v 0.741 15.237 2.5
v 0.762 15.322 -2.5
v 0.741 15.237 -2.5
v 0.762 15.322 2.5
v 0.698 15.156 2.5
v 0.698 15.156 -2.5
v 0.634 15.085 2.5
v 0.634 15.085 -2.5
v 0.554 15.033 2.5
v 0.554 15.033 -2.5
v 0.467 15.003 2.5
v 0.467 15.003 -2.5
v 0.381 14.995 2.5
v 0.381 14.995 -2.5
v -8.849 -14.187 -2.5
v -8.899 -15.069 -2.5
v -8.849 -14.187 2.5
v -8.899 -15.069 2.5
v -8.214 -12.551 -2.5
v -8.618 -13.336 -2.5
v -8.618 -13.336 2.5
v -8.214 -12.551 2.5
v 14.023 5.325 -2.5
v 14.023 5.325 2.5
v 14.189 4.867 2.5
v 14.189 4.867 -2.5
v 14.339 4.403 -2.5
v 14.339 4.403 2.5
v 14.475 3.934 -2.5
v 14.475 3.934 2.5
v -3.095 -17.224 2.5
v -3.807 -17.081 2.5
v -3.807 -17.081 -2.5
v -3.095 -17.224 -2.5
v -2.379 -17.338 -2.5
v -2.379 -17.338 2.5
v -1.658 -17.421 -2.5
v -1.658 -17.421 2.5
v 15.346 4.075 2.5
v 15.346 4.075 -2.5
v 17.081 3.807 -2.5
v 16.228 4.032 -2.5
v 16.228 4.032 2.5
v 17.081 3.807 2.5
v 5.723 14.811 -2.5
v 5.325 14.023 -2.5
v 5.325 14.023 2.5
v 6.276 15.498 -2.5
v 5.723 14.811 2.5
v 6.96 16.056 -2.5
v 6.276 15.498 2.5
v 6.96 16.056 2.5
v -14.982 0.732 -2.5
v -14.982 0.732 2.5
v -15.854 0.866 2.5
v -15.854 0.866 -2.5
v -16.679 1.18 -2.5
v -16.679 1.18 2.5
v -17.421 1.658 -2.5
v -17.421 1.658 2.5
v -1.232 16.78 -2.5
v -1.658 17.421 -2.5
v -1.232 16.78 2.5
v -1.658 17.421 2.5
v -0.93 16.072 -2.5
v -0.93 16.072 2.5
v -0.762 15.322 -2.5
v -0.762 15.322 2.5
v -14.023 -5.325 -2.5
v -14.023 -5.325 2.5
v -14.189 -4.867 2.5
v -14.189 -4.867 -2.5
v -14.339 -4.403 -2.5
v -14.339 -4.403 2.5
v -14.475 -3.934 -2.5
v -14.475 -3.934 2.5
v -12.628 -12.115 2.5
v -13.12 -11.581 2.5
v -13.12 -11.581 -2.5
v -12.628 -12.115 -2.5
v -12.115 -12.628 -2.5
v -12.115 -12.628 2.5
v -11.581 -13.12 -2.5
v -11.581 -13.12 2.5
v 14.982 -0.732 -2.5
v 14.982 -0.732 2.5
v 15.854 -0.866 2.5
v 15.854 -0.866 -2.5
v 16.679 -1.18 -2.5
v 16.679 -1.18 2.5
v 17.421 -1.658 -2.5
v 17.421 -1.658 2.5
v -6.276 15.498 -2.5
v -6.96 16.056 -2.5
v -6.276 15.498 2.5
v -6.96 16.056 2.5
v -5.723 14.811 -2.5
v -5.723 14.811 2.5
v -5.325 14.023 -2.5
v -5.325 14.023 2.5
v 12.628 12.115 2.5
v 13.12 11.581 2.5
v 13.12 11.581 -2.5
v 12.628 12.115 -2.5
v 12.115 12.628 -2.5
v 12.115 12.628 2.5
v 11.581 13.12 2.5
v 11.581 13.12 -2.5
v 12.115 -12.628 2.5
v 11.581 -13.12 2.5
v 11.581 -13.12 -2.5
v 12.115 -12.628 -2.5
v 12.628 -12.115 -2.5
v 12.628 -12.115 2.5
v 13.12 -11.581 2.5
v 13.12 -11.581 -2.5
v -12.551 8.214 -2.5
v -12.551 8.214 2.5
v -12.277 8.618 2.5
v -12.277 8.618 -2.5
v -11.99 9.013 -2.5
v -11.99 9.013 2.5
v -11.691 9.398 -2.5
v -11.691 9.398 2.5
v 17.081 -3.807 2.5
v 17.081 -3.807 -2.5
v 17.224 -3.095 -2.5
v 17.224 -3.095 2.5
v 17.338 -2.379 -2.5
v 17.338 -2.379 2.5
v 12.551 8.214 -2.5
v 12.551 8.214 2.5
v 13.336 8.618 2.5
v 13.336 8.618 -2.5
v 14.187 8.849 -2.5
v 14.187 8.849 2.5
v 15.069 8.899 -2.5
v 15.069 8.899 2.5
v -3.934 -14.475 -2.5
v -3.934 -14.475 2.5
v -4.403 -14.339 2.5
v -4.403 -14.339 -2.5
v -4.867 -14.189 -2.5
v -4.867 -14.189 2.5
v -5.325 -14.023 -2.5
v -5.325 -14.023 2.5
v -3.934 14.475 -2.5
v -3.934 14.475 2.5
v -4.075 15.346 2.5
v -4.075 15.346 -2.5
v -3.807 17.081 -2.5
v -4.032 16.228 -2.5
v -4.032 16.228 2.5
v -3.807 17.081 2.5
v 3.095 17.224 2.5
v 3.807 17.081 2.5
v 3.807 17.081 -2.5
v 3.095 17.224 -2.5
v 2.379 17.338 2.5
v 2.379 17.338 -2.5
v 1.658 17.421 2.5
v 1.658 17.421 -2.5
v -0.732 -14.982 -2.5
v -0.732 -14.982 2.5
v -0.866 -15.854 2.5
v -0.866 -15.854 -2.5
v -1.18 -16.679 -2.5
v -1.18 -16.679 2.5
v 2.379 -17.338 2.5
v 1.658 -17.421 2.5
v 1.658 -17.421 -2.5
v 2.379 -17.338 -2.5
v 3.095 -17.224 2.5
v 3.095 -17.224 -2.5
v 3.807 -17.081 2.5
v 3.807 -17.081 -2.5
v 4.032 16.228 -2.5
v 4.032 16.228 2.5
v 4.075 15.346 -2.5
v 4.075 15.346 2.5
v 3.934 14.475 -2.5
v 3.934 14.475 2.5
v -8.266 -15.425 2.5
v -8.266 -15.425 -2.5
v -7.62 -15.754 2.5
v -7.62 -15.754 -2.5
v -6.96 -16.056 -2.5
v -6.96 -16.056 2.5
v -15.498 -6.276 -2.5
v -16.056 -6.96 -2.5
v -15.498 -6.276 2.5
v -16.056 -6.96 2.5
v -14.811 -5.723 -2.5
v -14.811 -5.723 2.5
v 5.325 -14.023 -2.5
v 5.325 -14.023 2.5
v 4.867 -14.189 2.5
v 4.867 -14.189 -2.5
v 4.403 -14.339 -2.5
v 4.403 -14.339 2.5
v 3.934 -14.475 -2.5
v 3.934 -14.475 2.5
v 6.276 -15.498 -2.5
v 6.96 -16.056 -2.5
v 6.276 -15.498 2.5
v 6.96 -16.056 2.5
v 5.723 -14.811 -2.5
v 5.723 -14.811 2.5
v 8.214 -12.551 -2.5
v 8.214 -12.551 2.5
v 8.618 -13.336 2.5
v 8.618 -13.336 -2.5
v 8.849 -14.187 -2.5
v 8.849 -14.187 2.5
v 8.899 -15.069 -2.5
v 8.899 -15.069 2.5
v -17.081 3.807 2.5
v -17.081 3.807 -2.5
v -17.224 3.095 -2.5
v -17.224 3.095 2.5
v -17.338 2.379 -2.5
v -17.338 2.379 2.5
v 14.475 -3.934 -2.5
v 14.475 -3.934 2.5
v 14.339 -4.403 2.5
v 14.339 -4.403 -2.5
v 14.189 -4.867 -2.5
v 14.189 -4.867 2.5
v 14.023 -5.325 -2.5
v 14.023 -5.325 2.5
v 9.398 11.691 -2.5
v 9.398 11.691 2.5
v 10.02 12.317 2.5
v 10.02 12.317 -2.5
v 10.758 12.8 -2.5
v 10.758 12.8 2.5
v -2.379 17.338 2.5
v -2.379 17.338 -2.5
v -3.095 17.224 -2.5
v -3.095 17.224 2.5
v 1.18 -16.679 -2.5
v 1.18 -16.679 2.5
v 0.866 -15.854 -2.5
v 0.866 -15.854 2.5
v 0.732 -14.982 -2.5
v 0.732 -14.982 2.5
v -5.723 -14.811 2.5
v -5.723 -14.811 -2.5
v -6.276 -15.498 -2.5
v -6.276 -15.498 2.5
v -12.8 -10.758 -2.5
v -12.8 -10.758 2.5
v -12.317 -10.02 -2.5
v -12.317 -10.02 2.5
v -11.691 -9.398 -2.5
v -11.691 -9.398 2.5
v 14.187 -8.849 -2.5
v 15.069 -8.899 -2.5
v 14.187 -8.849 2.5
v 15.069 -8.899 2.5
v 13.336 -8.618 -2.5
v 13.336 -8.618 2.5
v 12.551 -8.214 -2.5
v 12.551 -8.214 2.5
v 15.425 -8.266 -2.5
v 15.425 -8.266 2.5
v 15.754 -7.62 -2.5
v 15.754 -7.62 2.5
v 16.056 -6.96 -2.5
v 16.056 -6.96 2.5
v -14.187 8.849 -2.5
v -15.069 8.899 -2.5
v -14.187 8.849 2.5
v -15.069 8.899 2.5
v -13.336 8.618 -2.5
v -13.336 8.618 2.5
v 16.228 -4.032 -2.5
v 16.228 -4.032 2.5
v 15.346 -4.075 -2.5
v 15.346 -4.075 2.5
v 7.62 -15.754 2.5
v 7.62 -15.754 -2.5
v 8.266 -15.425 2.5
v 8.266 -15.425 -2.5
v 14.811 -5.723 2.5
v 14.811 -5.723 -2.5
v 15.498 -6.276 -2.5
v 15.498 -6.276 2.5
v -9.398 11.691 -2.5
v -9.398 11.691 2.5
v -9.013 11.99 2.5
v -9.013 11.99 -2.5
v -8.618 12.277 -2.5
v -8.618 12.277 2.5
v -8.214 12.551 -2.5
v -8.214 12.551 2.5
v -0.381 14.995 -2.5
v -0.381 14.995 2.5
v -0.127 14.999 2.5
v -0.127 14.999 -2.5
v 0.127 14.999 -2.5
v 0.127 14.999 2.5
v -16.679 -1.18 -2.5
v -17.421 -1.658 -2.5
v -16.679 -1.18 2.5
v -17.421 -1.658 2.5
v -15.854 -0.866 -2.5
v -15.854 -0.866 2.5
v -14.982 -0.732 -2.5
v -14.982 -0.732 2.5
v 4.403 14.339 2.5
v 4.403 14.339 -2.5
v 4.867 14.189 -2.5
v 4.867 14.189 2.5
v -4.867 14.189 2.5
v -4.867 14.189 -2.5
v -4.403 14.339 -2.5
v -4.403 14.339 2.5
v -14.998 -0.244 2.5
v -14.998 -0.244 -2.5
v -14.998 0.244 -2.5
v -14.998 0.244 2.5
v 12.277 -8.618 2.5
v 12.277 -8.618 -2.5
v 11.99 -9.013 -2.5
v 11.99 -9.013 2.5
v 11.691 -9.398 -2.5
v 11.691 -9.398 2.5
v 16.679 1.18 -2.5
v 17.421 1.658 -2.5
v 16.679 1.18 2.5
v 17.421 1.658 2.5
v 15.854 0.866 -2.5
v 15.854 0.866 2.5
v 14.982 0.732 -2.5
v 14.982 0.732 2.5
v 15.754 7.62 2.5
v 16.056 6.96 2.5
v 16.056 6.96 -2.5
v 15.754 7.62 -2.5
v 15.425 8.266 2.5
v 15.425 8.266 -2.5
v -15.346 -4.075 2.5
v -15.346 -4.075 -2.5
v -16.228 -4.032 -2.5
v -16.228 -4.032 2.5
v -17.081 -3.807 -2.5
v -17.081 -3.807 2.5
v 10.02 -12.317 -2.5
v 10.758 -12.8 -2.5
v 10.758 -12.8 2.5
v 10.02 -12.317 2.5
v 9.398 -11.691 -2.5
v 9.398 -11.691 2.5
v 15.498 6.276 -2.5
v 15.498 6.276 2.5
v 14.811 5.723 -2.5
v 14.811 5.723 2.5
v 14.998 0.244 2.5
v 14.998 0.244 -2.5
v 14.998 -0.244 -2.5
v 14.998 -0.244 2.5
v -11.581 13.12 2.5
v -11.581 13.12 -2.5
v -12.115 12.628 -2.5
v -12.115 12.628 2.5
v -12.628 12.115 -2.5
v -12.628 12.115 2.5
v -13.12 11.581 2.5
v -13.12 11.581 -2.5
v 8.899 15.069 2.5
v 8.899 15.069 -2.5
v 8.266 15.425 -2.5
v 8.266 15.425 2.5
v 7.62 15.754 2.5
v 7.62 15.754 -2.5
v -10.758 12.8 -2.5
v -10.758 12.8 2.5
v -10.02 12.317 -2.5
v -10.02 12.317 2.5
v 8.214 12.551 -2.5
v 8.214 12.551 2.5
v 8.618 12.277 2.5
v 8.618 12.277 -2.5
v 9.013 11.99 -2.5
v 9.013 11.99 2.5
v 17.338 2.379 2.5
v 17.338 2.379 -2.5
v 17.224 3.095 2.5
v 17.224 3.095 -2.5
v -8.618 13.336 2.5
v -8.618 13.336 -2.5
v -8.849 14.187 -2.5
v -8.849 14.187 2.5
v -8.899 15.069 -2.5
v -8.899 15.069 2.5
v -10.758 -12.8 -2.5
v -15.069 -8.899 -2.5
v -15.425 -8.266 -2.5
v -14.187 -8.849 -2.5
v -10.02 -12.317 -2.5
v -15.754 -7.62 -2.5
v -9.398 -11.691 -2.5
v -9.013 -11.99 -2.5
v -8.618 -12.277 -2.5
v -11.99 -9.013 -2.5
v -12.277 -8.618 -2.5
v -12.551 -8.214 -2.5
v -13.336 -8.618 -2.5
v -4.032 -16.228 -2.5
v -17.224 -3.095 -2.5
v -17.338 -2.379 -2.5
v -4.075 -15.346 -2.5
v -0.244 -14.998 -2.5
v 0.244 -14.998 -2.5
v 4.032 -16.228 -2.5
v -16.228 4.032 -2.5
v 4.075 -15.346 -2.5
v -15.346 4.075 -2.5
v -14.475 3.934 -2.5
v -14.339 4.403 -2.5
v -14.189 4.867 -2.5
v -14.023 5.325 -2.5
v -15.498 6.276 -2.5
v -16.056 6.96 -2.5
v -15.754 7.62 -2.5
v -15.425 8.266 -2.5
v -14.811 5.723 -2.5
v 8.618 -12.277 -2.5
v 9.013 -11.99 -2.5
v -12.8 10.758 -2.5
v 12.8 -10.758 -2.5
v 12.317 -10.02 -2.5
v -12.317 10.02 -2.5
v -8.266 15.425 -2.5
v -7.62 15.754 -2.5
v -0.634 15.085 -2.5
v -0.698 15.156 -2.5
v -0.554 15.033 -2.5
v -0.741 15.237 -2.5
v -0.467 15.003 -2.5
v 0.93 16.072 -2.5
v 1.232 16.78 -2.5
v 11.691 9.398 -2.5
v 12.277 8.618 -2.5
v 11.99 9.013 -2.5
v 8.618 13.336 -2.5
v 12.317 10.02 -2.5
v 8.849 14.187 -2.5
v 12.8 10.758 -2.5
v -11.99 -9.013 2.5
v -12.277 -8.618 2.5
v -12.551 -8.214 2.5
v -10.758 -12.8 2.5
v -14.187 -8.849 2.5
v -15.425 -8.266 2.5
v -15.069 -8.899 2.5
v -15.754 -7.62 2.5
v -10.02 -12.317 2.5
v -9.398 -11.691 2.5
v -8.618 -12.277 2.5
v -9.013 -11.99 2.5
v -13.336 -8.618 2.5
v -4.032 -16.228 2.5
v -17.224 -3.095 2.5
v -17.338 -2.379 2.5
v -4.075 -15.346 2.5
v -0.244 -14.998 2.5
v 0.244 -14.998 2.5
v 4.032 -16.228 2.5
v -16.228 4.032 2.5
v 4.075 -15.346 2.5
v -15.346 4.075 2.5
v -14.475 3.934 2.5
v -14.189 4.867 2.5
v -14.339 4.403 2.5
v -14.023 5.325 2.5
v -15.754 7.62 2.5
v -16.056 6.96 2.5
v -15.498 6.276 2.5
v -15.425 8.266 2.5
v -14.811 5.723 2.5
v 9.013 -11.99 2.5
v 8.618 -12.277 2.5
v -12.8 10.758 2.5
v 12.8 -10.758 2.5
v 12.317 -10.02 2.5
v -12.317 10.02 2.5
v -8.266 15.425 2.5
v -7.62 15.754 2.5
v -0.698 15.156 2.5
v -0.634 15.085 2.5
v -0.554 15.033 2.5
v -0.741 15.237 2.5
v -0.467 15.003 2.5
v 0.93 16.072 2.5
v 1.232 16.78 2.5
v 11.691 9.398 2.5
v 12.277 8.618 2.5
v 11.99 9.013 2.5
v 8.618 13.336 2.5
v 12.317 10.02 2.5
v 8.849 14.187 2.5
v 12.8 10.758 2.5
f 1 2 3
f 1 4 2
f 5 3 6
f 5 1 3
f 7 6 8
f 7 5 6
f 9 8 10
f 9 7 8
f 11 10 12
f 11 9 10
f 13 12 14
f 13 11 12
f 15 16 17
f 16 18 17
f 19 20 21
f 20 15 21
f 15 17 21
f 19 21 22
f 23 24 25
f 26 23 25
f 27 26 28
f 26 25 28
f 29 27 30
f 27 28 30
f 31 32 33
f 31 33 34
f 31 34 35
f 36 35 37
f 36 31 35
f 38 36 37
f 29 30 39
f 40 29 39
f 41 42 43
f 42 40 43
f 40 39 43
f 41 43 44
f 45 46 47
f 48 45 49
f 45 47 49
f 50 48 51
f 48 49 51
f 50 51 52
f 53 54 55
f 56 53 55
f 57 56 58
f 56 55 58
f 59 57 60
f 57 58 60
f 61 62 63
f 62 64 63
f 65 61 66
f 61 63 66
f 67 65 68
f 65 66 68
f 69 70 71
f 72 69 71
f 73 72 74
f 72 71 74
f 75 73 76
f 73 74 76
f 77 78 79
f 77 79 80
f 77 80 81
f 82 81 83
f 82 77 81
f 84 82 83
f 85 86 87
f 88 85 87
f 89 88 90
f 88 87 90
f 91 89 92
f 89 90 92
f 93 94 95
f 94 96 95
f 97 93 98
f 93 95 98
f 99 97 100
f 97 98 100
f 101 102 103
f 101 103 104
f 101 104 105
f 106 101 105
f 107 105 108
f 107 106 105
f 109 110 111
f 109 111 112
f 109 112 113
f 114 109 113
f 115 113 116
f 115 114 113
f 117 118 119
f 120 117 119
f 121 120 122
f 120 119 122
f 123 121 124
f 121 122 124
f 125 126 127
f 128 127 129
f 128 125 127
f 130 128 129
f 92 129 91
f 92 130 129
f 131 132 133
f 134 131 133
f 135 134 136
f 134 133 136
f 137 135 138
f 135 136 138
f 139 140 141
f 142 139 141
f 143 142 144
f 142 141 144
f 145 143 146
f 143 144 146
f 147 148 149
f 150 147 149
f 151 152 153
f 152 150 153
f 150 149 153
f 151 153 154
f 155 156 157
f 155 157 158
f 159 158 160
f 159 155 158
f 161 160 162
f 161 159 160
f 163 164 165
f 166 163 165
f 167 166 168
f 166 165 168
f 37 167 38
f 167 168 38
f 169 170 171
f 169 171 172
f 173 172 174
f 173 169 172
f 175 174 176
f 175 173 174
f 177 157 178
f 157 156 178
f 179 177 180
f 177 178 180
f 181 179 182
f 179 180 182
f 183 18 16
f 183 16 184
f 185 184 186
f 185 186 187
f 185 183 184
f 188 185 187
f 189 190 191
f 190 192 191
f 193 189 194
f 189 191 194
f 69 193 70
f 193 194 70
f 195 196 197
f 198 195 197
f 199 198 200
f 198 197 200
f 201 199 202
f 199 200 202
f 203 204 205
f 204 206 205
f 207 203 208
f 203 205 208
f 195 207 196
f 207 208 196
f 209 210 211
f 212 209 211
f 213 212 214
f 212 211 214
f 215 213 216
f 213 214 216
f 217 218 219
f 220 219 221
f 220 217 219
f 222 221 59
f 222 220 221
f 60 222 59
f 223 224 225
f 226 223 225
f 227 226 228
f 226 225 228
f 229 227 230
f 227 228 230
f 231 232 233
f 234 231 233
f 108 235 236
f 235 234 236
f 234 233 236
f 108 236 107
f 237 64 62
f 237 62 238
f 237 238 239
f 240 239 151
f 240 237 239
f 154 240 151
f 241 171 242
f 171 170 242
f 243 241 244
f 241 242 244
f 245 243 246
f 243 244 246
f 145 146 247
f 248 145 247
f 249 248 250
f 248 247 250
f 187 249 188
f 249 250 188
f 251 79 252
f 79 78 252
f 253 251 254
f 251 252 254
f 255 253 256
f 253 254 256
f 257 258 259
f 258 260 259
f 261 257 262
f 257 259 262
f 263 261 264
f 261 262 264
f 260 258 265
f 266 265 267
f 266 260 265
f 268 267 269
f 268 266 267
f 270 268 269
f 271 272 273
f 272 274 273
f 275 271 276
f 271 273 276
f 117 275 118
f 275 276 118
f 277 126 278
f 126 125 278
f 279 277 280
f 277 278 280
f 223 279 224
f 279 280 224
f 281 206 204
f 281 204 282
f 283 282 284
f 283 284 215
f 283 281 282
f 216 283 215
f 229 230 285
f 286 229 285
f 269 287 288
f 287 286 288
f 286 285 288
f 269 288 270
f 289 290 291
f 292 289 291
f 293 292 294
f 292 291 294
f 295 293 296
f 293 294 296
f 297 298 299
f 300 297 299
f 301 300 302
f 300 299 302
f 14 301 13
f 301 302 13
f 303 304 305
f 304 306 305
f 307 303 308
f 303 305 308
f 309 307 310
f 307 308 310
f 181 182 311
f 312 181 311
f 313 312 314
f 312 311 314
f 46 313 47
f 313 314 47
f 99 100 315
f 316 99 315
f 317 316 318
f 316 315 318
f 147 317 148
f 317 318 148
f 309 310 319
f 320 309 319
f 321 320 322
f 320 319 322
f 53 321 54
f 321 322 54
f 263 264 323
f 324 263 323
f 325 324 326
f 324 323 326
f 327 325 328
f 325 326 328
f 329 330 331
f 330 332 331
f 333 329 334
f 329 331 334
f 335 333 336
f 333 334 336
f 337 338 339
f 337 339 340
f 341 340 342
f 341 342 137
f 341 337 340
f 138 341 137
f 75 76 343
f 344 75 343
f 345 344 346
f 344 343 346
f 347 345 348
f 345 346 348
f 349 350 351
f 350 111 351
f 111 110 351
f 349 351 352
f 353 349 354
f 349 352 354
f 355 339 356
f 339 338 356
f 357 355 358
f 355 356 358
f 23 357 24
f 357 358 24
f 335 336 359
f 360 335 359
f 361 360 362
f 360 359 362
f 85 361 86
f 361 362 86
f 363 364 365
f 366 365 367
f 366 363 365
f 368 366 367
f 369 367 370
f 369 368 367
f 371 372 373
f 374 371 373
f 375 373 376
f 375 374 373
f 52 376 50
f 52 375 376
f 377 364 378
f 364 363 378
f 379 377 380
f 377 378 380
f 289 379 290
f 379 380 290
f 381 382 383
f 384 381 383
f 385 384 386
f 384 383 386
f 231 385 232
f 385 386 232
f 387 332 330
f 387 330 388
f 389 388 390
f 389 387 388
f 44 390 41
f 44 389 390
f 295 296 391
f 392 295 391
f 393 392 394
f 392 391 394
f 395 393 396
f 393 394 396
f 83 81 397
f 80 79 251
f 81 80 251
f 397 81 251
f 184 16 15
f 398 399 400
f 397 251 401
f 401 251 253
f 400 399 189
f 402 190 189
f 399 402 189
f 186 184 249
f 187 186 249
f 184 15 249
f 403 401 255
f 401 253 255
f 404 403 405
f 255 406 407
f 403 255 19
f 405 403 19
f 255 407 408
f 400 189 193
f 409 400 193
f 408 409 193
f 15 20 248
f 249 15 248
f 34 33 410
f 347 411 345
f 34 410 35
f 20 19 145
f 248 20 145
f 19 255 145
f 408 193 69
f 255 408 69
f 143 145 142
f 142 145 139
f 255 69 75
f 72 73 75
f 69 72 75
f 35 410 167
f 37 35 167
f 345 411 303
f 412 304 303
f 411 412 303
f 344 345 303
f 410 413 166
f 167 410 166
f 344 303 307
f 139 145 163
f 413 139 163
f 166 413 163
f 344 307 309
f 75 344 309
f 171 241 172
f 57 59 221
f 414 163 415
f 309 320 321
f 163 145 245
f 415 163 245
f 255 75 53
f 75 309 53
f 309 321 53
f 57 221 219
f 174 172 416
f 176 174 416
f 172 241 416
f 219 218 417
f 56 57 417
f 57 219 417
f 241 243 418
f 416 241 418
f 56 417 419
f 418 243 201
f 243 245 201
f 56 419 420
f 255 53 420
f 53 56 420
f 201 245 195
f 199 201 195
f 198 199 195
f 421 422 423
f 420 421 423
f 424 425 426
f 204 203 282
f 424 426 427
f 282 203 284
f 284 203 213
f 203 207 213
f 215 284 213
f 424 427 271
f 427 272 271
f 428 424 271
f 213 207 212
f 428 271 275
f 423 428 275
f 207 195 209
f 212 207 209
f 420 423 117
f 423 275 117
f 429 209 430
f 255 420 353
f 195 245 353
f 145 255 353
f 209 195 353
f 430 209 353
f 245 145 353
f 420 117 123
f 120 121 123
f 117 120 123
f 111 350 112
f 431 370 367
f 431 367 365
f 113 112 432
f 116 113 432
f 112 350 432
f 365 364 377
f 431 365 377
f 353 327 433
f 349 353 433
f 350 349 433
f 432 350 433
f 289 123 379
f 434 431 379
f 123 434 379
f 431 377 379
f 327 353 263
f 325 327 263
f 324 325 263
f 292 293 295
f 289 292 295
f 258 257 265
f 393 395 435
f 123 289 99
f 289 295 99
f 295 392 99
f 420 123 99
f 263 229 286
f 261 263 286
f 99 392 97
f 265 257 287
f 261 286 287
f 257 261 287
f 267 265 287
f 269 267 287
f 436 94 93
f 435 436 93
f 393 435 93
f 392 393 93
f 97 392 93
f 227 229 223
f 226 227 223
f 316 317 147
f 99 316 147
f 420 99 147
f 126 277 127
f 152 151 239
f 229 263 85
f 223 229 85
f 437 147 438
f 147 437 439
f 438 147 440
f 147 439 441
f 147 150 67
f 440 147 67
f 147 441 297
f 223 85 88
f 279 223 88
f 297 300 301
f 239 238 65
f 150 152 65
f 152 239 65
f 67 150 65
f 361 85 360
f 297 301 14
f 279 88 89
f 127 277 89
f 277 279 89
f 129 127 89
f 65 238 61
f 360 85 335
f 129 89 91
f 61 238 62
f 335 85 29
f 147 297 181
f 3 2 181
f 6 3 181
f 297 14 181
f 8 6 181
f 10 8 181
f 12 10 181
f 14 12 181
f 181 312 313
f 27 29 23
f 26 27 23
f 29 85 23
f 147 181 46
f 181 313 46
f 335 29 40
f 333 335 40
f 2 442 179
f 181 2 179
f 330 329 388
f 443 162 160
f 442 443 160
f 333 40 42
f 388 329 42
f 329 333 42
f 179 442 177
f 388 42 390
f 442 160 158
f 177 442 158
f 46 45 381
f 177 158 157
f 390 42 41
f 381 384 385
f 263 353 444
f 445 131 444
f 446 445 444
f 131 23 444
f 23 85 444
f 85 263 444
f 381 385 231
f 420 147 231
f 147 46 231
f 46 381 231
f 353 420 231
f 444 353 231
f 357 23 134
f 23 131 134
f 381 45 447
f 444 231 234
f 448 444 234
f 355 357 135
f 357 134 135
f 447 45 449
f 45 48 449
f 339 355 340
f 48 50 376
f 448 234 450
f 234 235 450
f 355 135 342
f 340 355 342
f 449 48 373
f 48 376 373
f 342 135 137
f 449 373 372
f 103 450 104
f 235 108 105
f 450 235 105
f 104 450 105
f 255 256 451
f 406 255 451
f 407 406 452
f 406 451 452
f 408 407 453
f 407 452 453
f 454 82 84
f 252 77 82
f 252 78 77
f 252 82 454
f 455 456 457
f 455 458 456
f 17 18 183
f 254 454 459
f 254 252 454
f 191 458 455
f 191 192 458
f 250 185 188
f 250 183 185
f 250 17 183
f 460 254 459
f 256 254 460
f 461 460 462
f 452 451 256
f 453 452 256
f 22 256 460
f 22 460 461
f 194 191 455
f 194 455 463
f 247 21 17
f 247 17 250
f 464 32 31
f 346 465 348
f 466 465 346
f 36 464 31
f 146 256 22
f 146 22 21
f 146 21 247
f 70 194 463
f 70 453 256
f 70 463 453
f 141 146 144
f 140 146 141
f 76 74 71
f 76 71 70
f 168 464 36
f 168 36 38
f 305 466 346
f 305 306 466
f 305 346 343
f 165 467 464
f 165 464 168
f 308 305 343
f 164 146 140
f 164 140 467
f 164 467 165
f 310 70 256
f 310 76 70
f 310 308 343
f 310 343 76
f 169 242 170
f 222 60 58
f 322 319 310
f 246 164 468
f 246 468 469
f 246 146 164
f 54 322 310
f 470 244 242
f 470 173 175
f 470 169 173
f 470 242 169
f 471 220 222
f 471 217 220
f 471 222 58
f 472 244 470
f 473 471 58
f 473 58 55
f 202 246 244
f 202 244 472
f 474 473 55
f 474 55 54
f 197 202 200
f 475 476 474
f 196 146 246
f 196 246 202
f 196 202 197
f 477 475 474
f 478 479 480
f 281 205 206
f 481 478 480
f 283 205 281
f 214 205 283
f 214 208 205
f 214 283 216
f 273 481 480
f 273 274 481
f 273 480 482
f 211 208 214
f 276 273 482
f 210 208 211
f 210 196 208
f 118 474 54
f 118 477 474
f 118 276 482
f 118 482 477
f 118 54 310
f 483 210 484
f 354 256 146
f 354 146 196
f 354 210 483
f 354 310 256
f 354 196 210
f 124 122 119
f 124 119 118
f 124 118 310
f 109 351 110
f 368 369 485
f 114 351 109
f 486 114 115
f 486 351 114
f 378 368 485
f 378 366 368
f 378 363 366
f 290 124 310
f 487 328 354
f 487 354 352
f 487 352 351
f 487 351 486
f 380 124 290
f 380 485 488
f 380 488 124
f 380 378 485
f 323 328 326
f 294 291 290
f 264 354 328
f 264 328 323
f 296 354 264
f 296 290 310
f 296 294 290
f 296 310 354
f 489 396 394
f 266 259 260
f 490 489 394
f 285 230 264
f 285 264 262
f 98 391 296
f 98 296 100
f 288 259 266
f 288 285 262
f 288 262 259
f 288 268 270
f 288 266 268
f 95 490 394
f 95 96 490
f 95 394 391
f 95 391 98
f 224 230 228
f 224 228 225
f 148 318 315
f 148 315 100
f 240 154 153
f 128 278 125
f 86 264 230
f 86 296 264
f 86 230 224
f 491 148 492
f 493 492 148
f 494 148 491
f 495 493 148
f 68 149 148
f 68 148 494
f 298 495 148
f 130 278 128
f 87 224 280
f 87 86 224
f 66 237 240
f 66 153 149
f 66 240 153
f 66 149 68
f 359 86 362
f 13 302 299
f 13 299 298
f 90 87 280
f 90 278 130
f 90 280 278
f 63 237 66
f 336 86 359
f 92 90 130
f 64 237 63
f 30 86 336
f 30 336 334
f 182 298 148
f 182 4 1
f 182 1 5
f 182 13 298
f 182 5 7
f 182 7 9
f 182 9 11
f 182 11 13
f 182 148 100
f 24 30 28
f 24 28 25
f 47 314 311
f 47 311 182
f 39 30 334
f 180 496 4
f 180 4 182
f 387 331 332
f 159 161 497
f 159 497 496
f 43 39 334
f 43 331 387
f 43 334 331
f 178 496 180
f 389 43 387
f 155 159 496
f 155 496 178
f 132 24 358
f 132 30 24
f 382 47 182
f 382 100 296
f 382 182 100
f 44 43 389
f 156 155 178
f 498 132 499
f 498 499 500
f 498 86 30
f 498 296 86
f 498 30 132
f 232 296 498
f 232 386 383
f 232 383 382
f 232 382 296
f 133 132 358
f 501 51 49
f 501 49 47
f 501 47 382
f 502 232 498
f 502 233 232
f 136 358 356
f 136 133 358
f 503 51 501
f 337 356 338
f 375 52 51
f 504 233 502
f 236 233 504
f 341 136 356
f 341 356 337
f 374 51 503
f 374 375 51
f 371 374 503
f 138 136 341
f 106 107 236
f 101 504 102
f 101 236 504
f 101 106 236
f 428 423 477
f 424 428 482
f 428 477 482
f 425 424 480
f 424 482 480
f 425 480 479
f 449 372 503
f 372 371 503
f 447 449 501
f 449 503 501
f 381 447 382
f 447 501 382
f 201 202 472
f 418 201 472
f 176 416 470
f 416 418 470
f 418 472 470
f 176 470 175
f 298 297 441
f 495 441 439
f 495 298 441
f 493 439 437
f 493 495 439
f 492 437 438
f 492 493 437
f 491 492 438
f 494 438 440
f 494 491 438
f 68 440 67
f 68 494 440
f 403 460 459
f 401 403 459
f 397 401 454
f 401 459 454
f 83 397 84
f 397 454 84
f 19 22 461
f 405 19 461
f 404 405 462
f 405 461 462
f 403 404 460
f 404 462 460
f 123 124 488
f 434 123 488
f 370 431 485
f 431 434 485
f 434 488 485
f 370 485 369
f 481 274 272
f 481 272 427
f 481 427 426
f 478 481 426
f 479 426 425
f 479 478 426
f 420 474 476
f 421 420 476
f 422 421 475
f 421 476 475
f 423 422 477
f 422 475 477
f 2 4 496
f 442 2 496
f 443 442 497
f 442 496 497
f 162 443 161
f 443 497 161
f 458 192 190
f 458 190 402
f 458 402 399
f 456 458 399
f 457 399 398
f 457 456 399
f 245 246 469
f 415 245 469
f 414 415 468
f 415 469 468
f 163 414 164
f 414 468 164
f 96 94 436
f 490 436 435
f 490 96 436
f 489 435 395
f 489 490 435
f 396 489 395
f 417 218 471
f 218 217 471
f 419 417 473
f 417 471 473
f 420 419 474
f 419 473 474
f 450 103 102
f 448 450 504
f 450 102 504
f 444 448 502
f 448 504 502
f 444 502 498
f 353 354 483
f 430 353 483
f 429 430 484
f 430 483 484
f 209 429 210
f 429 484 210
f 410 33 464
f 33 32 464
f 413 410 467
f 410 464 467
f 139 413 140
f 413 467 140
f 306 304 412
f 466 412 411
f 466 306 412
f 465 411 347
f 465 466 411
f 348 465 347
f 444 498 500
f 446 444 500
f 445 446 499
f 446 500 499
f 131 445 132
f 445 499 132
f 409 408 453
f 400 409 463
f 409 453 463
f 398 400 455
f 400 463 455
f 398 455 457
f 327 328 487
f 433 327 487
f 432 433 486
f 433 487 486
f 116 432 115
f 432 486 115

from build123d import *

# Parameters (mm, degrees)
SKETCH1_R           = 17.5
BOSS_EXTRUDE1_DEPTH = 2.5
CUT_EXTRUDE1_DEPTH  = 25.874685928
FILLET2_R           = 0.375
CIRPATTERN1_COUNT   = 20


with BuildPart() as part:
    # Sketch1 → Boss-Extrude1 (new, symmetric)
    with BuildSketch(Plane.XY):
        Circle(SKETCH1_R)
    extrude(amount=BOSS_EXTRUDE1_DEPTH, both=True)

    # Sketch3 → Cut-Extrude1 (cut, symmetric)
    with BuildSketch(Plane.XY):
        with BuildLine():
            ThreePointArc((-2.639096151, 18.310793852), (-1.2854332, 16.875635392), (-0.731537344, 14.982151151))
            ThreePointArc((-0.731537344, 14.982151151), (0, 15), (0.731537344, 14.982151151))
            ThreePointArc((0.731537344, 14.982151151), (1.2854332, 16.875635392), (2.639096151, 18.310793852))
            ThreePointArc((2.639096151, 18.310793852), (0, 18.5), (-2.639096151, 18.310793852))
        make_face()
    cut_extrude1 = extrude(amount=CUT_EXTRUDE1_DEPTH, both=True, mode=Mode.SUBTRACT)

    # Fillet2
    fillet2_edges = [part.edges().sort_by_distance(p)[0] for p in [
        (-0.731537344, 14.982151151, 0),
        (0.731537344, 14.982151151, 0),
    ]]
    fillet(fillet2_edges, radius=FILLET2_R)

    # CirPattern1: Cut-Extrude1 ×20 about axis
    cirpattern1_axis = Axis((0, 0, 0), (0, 0, 1))
    for i in range(1, CIRPATTERN1_COUNT):
        add(cut_extrude1.rotate(cirpattern1_axis, i * 360 / CIRPATTERN1_COUNT), mode=Mode.SUBTRACT)


solid = part.part
